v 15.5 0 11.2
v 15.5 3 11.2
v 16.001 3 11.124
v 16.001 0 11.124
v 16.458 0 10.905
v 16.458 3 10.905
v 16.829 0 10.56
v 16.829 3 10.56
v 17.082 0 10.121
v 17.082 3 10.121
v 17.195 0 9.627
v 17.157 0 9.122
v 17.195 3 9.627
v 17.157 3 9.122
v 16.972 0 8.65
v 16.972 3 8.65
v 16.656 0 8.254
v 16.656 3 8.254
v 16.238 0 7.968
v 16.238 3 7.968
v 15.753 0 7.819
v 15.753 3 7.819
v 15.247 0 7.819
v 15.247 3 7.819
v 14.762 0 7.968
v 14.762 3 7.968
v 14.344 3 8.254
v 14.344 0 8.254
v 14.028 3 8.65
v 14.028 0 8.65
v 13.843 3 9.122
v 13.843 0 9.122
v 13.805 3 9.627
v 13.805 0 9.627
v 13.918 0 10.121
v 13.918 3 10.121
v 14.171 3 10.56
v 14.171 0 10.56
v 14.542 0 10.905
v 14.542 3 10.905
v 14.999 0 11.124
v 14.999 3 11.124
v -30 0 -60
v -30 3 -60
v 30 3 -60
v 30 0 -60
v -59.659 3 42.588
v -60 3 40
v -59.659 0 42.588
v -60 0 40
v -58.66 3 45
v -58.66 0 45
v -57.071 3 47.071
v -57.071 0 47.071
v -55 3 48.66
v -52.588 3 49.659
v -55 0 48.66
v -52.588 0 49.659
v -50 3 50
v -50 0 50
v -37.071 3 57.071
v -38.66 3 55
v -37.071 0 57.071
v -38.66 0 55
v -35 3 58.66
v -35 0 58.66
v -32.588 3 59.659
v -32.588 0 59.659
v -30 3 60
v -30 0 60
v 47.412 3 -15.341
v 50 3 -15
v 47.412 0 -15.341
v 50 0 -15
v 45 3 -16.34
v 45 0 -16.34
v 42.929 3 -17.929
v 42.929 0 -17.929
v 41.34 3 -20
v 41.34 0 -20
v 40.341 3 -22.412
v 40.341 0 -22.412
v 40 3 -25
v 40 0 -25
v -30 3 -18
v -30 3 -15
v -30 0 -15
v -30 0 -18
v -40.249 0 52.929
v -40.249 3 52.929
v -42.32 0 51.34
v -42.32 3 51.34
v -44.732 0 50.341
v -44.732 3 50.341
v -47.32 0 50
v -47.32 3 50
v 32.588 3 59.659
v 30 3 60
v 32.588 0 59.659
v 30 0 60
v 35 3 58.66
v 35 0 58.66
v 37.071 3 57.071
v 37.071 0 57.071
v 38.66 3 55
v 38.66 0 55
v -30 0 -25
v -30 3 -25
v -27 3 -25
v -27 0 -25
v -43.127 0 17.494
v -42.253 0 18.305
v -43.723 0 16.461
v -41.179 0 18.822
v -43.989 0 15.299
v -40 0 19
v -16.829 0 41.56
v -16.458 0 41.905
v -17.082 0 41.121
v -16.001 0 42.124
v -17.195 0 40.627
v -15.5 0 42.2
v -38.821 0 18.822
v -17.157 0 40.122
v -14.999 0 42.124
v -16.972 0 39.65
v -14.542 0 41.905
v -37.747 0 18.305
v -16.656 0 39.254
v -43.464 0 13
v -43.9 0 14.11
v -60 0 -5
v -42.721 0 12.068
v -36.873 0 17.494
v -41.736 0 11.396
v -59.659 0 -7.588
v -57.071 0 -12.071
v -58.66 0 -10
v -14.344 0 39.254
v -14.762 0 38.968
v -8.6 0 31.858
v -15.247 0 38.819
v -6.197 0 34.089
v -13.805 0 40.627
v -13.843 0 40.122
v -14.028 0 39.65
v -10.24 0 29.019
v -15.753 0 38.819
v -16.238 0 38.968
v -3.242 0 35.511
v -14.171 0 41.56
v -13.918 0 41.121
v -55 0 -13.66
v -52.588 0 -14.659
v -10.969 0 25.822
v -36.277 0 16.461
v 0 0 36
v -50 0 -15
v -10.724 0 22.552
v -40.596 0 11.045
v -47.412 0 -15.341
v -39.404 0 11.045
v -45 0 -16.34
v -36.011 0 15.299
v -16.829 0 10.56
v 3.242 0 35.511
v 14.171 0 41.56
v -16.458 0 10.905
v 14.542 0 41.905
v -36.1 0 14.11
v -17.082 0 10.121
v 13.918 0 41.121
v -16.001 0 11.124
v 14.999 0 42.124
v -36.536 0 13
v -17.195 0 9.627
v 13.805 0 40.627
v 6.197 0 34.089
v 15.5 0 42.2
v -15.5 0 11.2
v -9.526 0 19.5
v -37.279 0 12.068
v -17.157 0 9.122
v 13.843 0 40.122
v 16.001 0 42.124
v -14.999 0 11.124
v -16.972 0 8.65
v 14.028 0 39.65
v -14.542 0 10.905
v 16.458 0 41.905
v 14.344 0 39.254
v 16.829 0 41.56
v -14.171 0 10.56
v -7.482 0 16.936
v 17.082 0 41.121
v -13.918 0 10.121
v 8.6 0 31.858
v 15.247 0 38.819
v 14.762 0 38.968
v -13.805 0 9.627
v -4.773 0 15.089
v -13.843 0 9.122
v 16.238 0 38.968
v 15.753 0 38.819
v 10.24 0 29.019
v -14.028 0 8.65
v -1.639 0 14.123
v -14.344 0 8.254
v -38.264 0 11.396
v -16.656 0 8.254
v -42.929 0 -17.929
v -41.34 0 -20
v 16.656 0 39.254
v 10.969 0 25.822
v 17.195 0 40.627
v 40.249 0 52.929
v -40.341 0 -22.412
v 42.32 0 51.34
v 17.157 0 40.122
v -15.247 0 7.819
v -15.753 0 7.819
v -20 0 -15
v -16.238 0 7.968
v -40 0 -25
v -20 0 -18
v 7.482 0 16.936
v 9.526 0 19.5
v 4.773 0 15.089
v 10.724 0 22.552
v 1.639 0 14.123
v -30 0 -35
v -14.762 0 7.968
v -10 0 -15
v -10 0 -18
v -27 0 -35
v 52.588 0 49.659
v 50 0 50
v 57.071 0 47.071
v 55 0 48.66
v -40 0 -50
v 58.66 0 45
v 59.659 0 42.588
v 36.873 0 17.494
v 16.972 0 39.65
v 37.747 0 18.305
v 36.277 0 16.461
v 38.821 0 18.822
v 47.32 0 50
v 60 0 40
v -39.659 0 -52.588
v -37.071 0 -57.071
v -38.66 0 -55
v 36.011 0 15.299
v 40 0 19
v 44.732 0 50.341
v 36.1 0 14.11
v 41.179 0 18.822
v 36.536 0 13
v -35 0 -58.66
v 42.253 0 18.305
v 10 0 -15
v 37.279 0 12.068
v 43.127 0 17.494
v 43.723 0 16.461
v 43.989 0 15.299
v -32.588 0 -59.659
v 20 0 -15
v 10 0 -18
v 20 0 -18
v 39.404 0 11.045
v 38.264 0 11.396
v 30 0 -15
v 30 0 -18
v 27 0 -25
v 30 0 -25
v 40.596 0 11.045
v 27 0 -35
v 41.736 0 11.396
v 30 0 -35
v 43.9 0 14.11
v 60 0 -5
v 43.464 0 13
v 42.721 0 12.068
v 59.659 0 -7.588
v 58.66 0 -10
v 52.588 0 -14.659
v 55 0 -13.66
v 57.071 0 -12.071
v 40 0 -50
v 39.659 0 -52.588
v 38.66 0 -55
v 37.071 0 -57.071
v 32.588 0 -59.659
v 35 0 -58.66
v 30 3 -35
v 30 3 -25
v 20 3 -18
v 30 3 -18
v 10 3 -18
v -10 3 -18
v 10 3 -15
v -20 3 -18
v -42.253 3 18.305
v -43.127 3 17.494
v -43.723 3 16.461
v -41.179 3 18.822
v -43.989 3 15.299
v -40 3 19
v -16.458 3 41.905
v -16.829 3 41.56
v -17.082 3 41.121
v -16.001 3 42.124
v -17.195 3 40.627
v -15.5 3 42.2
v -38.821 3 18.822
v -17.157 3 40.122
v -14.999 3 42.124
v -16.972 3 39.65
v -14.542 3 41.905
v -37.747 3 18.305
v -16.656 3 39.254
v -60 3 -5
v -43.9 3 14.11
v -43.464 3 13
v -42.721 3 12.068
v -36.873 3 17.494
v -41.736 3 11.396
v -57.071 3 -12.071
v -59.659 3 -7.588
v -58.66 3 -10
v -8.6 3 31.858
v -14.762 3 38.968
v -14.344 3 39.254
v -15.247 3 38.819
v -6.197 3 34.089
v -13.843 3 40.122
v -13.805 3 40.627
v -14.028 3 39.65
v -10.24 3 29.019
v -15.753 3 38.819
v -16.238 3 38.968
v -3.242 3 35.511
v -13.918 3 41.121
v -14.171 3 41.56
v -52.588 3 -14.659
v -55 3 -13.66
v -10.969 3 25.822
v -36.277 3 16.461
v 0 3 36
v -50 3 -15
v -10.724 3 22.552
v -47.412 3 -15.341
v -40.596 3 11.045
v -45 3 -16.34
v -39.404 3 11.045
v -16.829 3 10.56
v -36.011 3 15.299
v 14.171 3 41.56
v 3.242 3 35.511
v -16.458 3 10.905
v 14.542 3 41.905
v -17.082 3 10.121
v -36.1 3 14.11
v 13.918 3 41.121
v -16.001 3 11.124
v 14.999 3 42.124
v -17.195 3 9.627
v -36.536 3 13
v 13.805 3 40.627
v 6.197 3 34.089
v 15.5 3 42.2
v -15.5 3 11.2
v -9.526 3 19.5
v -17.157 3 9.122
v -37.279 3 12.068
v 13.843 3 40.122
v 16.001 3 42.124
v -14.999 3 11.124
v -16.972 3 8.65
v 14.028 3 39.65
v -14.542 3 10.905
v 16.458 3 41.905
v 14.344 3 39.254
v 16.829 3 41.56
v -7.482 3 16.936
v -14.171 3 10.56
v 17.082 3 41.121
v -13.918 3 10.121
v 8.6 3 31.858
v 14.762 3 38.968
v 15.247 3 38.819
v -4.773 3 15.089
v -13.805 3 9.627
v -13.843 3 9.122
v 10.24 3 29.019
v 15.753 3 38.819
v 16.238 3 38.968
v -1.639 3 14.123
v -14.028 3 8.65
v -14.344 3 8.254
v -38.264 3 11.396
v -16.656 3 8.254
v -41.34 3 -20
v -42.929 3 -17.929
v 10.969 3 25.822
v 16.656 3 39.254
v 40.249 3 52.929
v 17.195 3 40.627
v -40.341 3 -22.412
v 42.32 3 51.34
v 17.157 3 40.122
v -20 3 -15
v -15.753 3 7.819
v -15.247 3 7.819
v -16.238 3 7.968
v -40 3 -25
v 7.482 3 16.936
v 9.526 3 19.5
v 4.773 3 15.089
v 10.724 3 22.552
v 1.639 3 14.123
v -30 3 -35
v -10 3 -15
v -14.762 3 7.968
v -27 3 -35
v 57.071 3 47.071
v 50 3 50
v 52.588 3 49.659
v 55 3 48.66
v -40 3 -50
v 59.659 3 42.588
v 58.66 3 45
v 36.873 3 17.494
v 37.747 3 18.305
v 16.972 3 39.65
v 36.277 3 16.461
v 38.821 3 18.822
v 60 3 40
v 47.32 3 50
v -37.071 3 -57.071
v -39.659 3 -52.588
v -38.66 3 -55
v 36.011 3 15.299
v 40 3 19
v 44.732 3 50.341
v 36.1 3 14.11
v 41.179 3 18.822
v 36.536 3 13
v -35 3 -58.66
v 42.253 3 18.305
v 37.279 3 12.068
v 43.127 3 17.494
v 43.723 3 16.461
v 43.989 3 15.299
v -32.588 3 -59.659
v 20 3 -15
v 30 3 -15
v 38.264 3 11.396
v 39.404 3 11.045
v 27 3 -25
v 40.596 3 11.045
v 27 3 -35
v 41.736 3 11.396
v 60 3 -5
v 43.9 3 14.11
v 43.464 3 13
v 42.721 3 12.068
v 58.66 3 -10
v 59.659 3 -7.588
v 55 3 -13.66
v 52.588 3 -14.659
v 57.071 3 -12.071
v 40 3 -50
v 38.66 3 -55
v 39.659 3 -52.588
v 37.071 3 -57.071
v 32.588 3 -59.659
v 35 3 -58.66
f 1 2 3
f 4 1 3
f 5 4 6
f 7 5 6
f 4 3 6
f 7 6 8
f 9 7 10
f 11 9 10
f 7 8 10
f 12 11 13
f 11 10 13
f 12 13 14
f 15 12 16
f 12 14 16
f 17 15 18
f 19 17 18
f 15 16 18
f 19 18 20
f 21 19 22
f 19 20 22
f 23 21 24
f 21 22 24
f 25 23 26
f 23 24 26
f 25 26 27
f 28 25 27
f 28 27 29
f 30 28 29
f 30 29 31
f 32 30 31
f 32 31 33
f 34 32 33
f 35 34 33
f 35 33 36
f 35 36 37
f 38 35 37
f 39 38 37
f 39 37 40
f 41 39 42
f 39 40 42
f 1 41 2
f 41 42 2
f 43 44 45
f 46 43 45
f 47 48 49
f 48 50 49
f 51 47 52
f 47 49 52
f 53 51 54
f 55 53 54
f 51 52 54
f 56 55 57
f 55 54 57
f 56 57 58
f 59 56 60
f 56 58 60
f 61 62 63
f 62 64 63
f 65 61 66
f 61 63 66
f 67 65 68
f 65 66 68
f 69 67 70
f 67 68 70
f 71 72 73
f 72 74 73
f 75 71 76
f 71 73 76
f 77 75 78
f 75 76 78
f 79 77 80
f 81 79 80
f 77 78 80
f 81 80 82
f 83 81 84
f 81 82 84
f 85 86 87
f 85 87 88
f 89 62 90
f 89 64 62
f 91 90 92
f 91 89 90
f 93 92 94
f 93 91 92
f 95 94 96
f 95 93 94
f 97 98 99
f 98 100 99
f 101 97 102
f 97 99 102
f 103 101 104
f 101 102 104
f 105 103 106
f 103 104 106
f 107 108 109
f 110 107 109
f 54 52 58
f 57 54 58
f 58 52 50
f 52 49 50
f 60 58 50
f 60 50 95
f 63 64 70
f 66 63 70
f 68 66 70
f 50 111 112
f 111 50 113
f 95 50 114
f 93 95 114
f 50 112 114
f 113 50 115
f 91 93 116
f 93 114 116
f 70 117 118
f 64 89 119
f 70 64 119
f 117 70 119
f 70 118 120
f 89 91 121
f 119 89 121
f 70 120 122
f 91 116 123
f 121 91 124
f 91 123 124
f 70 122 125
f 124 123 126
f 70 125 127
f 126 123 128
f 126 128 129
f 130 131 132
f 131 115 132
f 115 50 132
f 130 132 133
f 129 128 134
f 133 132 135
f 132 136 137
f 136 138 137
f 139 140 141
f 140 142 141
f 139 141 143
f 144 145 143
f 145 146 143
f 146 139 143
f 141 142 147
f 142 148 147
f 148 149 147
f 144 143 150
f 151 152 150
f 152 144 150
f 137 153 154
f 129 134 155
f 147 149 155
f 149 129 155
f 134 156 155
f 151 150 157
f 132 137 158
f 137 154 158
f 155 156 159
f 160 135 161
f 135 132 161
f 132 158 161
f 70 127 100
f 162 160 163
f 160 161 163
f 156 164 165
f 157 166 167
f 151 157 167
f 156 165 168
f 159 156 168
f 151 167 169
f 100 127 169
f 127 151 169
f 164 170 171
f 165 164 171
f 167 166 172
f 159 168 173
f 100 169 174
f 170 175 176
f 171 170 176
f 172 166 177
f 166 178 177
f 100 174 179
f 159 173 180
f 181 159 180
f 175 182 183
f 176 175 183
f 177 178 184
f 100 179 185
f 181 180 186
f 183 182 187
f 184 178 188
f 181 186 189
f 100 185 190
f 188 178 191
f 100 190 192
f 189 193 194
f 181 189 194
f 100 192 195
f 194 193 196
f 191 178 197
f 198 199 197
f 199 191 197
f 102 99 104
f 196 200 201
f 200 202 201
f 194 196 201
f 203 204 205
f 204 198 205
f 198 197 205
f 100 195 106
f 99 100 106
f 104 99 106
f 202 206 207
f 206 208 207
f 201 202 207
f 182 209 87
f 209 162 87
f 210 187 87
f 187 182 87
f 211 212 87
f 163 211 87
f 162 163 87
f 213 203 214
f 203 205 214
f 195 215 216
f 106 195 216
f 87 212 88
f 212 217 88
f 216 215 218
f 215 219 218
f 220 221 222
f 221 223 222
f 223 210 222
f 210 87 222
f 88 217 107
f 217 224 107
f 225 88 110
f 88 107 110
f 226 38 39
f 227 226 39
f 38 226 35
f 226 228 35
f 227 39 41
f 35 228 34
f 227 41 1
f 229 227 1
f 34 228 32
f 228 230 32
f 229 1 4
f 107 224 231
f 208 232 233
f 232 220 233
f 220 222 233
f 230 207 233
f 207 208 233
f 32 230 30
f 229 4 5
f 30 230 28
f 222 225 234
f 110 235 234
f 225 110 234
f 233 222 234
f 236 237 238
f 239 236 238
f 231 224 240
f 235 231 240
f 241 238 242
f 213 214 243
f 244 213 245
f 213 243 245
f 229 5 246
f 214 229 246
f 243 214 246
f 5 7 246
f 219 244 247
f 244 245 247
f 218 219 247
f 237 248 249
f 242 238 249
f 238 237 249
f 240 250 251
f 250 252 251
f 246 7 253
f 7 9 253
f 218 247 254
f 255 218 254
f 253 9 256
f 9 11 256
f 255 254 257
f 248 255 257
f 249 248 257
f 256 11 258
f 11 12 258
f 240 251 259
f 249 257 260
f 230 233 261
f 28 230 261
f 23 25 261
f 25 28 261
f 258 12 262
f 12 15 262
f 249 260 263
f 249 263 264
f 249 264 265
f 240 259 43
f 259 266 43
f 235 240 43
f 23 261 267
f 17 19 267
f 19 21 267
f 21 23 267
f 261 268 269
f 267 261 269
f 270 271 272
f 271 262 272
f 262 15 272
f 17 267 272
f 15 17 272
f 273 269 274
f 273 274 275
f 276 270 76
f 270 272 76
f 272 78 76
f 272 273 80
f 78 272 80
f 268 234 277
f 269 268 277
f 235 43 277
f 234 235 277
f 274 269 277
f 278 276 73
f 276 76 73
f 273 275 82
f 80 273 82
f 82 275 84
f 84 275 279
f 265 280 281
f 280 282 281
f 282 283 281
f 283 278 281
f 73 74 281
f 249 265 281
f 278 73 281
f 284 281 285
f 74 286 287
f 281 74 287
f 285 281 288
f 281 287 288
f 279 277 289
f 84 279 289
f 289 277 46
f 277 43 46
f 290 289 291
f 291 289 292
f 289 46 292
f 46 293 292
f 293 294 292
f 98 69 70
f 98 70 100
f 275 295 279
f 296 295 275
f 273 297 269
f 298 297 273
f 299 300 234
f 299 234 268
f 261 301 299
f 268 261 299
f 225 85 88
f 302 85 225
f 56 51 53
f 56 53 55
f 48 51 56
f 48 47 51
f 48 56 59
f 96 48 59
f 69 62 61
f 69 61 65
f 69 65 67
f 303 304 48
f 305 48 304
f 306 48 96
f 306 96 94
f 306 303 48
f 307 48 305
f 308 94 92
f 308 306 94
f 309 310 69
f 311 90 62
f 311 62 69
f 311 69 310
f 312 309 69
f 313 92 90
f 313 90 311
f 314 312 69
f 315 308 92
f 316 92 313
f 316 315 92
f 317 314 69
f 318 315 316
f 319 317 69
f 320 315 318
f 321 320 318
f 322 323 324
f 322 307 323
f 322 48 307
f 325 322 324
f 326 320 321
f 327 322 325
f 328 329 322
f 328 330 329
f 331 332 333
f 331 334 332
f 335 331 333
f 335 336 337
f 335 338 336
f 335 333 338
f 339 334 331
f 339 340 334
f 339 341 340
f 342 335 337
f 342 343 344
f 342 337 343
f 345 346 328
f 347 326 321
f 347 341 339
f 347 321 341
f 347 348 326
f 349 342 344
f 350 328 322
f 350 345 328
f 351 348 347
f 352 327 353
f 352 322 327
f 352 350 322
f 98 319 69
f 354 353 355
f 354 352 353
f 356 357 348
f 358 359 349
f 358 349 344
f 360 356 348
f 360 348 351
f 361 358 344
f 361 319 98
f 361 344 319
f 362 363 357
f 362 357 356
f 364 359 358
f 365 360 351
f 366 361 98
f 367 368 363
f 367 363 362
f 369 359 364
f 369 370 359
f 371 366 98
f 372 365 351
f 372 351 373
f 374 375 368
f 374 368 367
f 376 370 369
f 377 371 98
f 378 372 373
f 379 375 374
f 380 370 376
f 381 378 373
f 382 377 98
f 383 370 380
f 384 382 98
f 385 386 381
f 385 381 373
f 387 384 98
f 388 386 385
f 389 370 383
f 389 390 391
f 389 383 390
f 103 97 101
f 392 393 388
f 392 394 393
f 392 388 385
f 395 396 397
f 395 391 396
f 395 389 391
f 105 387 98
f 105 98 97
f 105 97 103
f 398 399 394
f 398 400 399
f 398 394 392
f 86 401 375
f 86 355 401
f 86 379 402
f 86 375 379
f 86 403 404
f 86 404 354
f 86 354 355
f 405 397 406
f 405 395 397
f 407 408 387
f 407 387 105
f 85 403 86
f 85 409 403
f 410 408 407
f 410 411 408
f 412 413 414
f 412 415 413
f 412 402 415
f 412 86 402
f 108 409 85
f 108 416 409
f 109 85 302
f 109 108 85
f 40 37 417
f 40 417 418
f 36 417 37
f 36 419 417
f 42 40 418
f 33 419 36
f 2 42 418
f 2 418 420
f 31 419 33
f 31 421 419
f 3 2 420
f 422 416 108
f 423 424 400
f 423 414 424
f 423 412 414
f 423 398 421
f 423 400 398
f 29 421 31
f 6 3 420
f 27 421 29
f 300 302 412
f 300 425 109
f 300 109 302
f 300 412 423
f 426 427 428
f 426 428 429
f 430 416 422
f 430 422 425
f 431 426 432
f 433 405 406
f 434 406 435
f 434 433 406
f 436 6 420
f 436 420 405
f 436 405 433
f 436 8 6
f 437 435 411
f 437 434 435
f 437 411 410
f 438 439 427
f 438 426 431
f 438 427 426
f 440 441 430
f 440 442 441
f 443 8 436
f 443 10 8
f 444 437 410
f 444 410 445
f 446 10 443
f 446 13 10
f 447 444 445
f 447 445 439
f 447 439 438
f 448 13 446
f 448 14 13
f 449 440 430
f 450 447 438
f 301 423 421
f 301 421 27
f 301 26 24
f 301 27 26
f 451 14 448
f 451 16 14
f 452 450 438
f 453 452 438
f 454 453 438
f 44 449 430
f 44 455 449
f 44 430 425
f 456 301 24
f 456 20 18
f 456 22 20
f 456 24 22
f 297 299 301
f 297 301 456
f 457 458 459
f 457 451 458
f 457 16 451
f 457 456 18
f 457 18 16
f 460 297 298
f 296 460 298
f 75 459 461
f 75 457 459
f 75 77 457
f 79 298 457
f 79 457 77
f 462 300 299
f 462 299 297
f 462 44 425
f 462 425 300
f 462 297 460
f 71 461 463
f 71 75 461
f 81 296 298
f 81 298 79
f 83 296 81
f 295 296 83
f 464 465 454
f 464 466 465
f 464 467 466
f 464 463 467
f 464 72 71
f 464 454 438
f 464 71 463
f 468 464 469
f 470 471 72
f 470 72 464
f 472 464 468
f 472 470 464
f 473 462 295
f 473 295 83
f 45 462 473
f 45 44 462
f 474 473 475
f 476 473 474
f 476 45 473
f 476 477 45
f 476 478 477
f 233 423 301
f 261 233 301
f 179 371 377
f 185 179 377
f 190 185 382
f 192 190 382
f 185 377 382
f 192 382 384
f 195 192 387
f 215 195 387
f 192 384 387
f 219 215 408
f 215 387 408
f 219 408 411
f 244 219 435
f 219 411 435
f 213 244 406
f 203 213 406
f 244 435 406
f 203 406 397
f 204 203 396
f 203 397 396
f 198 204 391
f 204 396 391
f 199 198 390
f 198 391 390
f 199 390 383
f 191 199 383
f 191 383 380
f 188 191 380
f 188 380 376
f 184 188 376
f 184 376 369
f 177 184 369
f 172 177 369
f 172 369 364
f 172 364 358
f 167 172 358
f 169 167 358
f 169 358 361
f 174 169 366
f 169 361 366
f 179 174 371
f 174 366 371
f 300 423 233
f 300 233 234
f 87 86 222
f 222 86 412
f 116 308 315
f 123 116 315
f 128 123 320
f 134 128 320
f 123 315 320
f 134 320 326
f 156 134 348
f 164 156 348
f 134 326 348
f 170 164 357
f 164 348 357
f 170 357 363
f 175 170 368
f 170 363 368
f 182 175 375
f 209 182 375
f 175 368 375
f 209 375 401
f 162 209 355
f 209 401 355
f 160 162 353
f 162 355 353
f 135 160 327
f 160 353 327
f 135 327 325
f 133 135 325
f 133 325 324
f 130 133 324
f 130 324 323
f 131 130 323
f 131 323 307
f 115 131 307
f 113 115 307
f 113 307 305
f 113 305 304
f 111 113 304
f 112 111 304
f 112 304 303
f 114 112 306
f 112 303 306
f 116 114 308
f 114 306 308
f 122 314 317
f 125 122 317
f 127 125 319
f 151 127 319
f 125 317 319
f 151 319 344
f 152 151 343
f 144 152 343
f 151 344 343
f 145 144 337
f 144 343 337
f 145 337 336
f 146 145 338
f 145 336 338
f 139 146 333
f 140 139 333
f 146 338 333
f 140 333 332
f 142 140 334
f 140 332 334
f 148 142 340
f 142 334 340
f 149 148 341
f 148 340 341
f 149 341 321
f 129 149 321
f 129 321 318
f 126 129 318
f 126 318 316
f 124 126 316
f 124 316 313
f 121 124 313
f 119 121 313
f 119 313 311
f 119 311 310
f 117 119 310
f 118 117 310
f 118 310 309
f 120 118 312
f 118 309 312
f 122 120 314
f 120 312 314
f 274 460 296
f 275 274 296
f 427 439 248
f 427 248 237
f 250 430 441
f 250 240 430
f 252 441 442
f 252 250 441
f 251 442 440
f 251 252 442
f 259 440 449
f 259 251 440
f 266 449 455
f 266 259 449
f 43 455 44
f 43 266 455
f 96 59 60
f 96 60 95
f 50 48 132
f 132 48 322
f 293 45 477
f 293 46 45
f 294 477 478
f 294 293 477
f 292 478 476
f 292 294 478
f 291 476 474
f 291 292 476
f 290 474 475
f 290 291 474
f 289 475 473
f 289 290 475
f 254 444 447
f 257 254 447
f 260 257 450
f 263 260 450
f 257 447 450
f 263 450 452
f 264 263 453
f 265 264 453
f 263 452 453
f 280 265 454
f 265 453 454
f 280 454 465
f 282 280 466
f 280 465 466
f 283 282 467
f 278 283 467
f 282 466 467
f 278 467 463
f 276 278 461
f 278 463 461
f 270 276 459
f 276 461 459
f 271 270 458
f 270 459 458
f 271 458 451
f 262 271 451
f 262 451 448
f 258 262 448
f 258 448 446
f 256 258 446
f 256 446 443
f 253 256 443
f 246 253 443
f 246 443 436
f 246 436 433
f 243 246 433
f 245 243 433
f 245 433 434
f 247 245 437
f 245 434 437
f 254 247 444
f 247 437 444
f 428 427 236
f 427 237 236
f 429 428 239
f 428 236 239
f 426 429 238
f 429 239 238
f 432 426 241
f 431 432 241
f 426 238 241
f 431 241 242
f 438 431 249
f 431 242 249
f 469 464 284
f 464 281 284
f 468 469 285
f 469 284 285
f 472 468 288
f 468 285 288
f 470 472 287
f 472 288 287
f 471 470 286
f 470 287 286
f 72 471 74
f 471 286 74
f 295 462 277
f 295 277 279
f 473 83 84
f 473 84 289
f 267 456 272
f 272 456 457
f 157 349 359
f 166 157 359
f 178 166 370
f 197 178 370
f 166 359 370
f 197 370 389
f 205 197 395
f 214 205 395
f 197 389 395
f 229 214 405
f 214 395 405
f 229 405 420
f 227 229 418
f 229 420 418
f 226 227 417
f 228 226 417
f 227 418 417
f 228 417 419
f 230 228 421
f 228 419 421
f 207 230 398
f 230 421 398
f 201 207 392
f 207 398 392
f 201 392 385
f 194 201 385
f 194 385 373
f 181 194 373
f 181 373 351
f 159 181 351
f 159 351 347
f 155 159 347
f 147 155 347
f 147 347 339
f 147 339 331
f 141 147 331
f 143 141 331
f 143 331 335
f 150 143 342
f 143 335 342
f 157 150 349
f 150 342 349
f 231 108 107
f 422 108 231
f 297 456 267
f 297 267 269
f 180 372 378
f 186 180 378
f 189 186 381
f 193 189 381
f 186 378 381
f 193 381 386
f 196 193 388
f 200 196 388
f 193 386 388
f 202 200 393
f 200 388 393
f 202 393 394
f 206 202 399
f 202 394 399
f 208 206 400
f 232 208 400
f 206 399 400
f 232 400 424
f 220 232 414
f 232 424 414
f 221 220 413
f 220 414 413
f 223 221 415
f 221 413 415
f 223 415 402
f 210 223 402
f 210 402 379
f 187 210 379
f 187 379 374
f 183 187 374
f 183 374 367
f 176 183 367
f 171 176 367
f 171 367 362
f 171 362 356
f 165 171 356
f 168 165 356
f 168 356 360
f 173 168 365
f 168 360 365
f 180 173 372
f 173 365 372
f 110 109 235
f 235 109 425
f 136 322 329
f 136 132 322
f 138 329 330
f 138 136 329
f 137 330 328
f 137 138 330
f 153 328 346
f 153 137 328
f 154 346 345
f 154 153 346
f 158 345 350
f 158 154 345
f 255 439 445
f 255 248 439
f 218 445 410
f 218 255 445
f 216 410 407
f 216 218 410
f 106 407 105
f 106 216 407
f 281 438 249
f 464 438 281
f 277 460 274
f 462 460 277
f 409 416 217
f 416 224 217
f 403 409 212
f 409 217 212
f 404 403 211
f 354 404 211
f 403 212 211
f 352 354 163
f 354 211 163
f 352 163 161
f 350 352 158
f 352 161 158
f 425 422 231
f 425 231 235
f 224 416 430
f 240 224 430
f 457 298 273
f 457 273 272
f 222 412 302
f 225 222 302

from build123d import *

# Parameters (mm, degrees)
SKETCH1_W           = 60
SKETCH1_H           = 90
BOSS_EXTRUDE1_DEPTH = 3
SKETCH2_W           = 10
SKETCH2_H           = 3
SKETCH2_W_2         = 3
SKETCH2_H_2         = 10
SKETCH2_W_3         = 20
CUT_EXTRUDE2_DEPTH  = 3
SKETCH3_W           = 80
SKETCH3_H           = 120
BOSS_EXTRUDE2_DEPTH = 3
FILLET1_R           = 10
FILLET2_R           = 10
SKETCH4_R           = 1.7
CUT_EXTRUDE3_DEPTH  = 3
SKETCH5_R           = 11
CUT_EXTRUDE4_DEPTH  = 3
SKETCH6_W           = 20
SKETCH6_H           = 65
BOSS_EXTRUDE3_DEPTH = 3
FILLET3_R           = 10
SKETCH7_R           = 4
CUT_EXTRUDE5_DEPTH  = 3


with BuildPart() as part:
    # Sketch1 → Boss-Extrude1 (new body)
    with BuildSketch(Plane(origin=(0, 0, 0), x_dir=(1, 0, 0), z_dir=(0, 1, 0))):
        Rectangle(SKETCH1_W, SKETCH1_H)
    extrude(amount=BOSS_EXTRUDE1_DEPTH)

    # Sketch2 → Cut-Extrude2 (cut)
    with BuildSketch(Plane(origin=(0, 3, 0), x_dir=(1, 0, 0), z_dir=(0, 1, 0))):
        with Locations((25, 16.5)):
            Rectangle(SKETCH2_W, SKETCH2_H)
        with Locations((-28.5, 30)):
            Rectangle(SKETCH2_W_2, SKETCH2_H_2)
        with Locations((-25, 16.5)):
            Rectangle(SKETCH2_W, SKETCH2_H)
        with Locations((0, 16.5)):
            Rectangle(SKETCH2_W_3, SKETCH2_H)
        with Locations((28.5, 30)):
            Rectangle(SKETCH2_W_2, SKETCH2_H_2)
    extrude(amount=-CUT_EXTRUDE2_DEPTH, mode=Mode.SUBTRACT)

    # Sketch3 → Boss-Extrude2 (add)
    with BuildSketch(Plane(origin=(0, 3, 0), x_dir=(1, 0, 0), z_dir=(0, 1, 0))):
        Rectangle(SKETCH3_W, SKETCH3_H)
        Polygon((-30, 18), (-30, -45), (30, -45), (30, 18), (30, 25), (30, 45), (-30, 45), (-30, 35), align=None, mode=Mode.SUBTRACT)
    extrude(amount=-BOSS_EXTRUDE2_DEPTH)

    # Fillet1
    fillet1_edges = [part.edges().sort_by_distance(p)[0] for p in [
        (-40, 1.5, 60),
        (40, 1.5, 60),
    ]]
    fillet(fillet1_edges, radius=FILLET1_R)

    # Fillet2
    fillet2_edges = [part.edges().sort_by_distance(p)[0] for p in [
        (-40, 1.5, -60),
        (40, 1.5, -60),
    ]]
    fillet(fillet2_edges, radius=FILLET2_R)

    # Sketch4 → Cut-Extrude3 (cut)
    with BuildSketch(Plane(origin=(0, 3, 0), x_dir=(1, 0, 0), z_dir=(0, 1, 0))):
        with Locations(Location((15.5, -9.5, 0), (0, 0, 270))):
            Circle(SKETCH4_R)
        with Locations(Location((15.5, -40.5, 0), (0, 0, 270))):
            Circle(SKETCH4_R)
        with Locations(Location((-15.5, -40.5, 0), (0, 0, 270))):
            Circle(SKETCH4_R)
        with Locations(Location((-15.5, -9.5, 0), (0, 0, 270))):
            Circle(SKETCH4_R)
    extrude(amount=-CUT_EXTRUDE3_DEPTH, mode=Mode.SUBTRACT)

    # Sketch5 → Cut-Extrude4 (cut)
    with BuildSketch(Plane(origin=(0, 3, 0), x_dir=(1, 0, 0), z_dir=(0, 1, 0))):
        with Locations(Location((0, -25, 0), (0, 0, 270))):
            Circle(SKETCH5_R)
    extrude(amount=-CUT_EXTRUDE4_DEPTH, mode=Mode.SUBTRACT)

    # Sketch6 → Boss-Extrude3 (add)
    with BuildSketch(Plane(origin=(0, 3, 0), x_dir=(1, 0, 0), z_dir=(0, 1, 0))):
        with Locations((50, -17.5)):
            Rectangle(SKETCH6_W, SKETCH6_H)
        with Locations((-50, -17.5)):
            Rectangle(SKETCH6_W, SKETCH6_H)
    extrude(amount=-BOSS_EXTRUDE3_DEPTH)

    # Fillet3
    fillet3_edges = [part.edges().sort_by_distance(p)[0] for p in [
        (-40, 1.5, 50),
        (-60, 1.5, 50),
        (-40, 1.5, -15),
        (-60, 1.5, -15),
        (40, 1.5, -15),
        (60, 1.5, -15),
        (60, 1.5, 50),
        (40, 1.5, 50),
    ]]
    fillet(fillet3_edges, radius=FILLET3_R - 0.0001)  # a hair under: the kernel refuses the full size

    # Sketch7 → Cut-Extrude5 (cut)
    with BuildSketch(Plane(origin=(0, 3, 0), x_dir=(1, 0, 0), z_dir=(0, 1, 0))):
        with Locations(Location((-40, -15, 0), (0, 0, 270))):
            Circle(SKETCH7_R)
        with Locations(Location((40, -15, 0), (0, 0, 270))):
            Circle(SKETCH7_R)
    extrude(amount=-CUT_EXTRUDE5_DEPTH, mode=Mode.SUBTRACT)


solid = part.part
